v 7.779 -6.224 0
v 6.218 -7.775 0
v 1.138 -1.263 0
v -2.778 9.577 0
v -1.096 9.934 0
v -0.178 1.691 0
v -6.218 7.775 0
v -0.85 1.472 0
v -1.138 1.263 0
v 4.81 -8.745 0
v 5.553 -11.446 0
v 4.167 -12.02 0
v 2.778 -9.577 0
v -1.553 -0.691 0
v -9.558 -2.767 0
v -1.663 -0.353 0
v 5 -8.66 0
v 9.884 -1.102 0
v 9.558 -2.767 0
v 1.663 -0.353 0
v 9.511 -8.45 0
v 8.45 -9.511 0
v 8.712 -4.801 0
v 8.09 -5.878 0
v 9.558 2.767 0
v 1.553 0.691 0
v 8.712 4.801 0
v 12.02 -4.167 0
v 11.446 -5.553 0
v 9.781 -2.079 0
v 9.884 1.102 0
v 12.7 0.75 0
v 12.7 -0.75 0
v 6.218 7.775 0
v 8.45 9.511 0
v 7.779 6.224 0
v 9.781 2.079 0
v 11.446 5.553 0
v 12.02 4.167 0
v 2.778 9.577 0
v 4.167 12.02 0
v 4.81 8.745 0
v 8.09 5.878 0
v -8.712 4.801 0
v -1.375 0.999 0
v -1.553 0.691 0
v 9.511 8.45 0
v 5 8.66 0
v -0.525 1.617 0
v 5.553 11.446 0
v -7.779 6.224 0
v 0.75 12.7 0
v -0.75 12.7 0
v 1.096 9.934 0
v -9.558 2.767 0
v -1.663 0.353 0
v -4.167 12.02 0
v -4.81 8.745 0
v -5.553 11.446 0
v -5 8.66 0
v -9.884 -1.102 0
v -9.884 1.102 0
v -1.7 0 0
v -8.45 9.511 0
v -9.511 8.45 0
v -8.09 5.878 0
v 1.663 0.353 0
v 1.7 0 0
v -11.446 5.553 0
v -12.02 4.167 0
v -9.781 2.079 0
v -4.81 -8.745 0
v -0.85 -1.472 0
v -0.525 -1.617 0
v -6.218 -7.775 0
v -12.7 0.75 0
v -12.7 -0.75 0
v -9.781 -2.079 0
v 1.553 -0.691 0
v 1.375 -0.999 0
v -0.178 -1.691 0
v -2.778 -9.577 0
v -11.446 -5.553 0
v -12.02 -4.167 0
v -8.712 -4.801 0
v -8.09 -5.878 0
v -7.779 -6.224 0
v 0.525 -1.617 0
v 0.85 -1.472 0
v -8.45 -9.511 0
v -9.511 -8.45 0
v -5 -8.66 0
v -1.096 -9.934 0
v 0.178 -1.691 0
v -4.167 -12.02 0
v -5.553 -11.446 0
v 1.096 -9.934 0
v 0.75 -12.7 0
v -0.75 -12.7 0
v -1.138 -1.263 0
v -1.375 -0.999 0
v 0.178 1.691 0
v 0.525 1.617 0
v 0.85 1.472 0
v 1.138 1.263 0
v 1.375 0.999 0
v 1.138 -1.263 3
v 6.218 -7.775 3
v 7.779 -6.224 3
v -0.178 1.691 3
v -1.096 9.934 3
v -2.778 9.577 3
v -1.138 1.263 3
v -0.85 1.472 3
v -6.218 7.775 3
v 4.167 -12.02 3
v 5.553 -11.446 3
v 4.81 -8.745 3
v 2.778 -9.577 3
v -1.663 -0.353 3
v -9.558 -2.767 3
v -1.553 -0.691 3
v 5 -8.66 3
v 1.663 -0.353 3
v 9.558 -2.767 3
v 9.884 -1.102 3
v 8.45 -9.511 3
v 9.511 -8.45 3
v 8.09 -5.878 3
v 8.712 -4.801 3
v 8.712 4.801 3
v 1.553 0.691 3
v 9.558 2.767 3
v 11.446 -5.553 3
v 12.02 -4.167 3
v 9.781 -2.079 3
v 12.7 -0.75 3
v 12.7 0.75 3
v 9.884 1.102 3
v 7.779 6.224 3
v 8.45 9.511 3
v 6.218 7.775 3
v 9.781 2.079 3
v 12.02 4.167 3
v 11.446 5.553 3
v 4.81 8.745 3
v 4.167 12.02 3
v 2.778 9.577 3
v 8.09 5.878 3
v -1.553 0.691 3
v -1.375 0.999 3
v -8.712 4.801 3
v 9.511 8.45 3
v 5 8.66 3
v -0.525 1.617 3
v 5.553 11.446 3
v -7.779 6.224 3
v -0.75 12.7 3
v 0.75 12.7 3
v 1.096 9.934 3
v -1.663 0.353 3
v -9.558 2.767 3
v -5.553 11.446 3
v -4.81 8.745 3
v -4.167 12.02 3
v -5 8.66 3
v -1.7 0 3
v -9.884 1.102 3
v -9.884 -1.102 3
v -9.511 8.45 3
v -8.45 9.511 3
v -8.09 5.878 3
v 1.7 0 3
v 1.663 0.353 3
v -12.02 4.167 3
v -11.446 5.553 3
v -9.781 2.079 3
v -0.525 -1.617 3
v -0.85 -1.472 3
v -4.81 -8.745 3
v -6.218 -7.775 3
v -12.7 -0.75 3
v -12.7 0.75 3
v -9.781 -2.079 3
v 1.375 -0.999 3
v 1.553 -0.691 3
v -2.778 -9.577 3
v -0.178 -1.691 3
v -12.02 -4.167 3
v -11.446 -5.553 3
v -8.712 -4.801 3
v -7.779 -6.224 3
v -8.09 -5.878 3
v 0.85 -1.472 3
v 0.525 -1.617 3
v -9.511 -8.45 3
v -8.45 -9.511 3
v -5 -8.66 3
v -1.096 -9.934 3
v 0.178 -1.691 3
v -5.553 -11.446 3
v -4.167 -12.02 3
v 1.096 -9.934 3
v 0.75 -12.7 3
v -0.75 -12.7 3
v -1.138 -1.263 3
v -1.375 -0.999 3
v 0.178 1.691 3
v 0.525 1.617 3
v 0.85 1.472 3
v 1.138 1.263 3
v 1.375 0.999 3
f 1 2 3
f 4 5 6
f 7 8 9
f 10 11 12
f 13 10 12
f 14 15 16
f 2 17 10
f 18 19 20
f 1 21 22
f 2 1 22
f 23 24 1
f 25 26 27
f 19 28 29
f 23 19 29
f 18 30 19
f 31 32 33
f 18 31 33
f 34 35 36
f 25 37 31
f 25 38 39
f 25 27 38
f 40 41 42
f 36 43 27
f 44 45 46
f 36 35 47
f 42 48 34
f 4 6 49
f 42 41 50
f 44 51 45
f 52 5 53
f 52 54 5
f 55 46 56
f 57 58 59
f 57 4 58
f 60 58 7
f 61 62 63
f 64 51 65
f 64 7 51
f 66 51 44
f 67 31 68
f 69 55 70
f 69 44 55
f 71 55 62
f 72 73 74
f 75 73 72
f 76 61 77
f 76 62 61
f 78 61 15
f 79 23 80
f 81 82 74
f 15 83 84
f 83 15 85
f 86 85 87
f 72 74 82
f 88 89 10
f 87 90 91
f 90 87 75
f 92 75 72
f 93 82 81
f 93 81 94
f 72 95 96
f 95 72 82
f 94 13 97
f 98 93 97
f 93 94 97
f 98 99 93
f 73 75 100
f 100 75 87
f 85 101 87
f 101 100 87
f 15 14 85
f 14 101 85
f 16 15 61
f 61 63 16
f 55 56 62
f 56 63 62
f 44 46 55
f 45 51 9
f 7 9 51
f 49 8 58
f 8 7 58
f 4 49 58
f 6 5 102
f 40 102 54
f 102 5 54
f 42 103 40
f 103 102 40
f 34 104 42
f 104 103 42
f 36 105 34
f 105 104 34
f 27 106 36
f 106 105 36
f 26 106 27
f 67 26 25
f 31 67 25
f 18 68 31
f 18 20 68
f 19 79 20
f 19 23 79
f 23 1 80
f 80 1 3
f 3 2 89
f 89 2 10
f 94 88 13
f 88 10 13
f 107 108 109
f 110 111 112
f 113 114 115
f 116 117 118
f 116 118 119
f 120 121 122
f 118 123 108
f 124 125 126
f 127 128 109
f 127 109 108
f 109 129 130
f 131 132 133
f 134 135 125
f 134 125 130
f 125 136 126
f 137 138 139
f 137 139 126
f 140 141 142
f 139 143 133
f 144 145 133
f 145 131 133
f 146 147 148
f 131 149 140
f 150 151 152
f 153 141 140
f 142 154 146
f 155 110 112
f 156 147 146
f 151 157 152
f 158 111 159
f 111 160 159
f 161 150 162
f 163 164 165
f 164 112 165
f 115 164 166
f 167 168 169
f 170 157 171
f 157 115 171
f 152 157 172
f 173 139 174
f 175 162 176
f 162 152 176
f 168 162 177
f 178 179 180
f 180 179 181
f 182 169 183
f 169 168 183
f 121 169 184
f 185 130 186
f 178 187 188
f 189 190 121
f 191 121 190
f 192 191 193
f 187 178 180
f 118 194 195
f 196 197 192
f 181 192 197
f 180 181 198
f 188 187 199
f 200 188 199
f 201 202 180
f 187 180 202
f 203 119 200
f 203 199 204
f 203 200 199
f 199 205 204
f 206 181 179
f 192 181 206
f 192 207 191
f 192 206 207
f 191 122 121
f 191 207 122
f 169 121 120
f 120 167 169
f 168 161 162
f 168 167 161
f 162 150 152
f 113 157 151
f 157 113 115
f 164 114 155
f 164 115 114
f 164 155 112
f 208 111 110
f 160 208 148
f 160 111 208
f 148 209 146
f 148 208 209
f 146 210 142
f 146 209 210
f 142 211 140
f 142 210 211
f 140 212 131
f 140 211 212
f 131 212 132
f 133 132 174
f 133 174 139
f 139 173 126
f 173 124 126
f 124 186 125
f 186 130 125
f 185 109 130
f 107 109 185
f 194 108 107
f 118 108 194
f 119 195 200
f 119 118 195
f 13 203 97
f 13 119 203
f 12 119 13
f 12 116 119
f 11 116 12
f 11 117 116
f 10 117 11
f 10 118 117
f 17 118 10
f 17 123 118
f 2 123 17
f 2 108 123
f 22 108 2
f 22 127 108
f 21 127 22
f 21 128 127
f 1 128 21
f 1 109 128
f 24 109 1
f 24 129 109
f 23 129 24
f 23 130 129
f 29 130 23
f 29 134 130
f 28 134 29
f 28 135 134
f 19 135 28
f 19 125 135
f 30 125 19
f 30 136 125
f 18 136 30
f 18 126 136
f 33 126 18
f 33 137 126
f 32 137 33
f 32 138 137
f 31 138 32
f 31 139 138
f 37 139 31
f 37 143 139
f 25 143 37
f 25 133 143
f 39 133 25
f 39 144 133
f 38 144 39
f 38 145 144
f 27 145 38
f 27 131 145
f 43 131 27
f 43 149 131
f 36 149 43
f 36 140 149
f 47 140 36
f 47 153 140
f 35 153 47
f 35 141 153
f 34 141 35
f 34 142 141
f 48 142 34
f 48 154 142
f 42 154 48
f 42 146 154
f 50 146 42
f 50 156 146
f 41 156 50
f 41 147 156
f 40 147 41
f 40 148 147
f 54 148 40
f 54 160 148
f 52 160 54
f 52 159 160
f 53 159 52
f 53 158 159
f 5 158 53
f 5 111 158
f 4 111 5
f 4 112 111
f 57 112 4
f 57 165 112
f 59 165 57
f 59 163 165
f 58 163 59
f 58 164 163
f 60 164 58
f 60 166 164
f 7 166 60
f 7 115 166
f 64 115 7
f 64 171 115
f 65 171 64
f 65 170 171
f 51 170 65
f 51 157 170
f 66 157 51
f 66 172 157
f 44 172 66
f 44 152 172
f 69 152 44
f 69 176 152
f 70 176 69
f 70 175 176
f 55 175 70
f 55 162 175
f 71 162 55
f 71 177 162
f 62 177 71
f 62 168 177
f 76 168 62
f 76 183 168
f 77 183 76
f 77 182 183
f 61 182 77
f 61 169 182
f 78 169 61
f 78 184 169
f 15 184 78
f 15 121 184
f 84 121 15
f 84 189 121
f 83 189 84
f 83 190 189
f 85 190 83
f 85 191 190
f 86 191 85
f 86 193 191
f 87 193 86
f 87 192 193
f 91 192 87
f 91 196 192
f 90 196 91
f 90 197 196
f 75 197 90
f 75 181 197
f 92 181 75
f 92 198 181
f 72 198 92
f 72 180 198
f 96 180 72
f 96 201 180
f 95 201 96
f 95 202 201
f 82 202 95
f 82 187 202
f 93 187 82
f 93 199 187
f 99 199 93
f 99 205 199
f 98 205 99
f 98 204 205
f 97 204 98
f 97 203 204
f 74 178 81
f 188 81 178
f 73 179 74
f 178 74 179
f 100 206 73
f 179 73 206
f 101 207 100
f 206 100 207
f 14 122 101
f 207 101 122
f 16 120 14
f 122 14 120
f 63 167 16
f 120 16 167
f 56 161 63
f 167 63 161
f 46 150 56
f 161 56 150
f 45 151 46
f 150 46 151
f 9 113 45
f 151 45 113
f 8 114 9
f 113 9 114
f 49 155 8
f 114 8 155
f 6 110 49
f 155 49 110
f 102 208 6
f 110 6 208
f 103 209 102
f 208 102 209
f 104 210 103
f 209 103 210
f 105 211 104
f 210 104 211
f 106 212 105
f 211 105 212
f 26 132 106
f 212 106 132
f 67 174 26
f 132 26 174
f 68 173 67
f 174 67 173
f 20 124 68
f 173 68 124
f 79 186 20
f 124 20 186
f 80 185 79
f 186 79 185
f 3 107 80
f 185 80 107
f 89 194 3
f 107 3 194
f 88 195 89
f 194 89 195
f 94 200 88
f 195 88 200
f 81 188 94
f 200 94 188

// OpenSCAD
module 2d_gear(r, teeth, angle, start_angle, round) {
    circle(r=r);
    t = round == true ? round(teeth) : teeth;
    a = angle/t;
    for (i = [start_angle:a:start_angle+angle])
    rotate([0,0,i])
    translate([r,0,0]) {
        children();
    }
}

module gear(r, h, teeth, center_r = 0, angle = 360, start_angle = 0, teeth_h = 1, round=true) {
    linear_extrude(height=h)
    difference() {
        2d_gear(r=r, teeth=teeth, angle=angle, start_angle=start_angle, round=round) {
            scale([2,1,1] * r*1.5 / 10*teeth_h)
            translate([-0.1,1.5,0])
            rotate([0,0,-90])
            polygon([
                [0.75,0],
                [1,1],
                [2,1],
                [2.25,0],
            ]);
            
        }
        circle(r=center_r, $fn=30);
    }
}

 gear(r=10, h=3, teeth=15.7, center_r = 3/2+0.2, angle = 360, start_angle = 360,round=true);
